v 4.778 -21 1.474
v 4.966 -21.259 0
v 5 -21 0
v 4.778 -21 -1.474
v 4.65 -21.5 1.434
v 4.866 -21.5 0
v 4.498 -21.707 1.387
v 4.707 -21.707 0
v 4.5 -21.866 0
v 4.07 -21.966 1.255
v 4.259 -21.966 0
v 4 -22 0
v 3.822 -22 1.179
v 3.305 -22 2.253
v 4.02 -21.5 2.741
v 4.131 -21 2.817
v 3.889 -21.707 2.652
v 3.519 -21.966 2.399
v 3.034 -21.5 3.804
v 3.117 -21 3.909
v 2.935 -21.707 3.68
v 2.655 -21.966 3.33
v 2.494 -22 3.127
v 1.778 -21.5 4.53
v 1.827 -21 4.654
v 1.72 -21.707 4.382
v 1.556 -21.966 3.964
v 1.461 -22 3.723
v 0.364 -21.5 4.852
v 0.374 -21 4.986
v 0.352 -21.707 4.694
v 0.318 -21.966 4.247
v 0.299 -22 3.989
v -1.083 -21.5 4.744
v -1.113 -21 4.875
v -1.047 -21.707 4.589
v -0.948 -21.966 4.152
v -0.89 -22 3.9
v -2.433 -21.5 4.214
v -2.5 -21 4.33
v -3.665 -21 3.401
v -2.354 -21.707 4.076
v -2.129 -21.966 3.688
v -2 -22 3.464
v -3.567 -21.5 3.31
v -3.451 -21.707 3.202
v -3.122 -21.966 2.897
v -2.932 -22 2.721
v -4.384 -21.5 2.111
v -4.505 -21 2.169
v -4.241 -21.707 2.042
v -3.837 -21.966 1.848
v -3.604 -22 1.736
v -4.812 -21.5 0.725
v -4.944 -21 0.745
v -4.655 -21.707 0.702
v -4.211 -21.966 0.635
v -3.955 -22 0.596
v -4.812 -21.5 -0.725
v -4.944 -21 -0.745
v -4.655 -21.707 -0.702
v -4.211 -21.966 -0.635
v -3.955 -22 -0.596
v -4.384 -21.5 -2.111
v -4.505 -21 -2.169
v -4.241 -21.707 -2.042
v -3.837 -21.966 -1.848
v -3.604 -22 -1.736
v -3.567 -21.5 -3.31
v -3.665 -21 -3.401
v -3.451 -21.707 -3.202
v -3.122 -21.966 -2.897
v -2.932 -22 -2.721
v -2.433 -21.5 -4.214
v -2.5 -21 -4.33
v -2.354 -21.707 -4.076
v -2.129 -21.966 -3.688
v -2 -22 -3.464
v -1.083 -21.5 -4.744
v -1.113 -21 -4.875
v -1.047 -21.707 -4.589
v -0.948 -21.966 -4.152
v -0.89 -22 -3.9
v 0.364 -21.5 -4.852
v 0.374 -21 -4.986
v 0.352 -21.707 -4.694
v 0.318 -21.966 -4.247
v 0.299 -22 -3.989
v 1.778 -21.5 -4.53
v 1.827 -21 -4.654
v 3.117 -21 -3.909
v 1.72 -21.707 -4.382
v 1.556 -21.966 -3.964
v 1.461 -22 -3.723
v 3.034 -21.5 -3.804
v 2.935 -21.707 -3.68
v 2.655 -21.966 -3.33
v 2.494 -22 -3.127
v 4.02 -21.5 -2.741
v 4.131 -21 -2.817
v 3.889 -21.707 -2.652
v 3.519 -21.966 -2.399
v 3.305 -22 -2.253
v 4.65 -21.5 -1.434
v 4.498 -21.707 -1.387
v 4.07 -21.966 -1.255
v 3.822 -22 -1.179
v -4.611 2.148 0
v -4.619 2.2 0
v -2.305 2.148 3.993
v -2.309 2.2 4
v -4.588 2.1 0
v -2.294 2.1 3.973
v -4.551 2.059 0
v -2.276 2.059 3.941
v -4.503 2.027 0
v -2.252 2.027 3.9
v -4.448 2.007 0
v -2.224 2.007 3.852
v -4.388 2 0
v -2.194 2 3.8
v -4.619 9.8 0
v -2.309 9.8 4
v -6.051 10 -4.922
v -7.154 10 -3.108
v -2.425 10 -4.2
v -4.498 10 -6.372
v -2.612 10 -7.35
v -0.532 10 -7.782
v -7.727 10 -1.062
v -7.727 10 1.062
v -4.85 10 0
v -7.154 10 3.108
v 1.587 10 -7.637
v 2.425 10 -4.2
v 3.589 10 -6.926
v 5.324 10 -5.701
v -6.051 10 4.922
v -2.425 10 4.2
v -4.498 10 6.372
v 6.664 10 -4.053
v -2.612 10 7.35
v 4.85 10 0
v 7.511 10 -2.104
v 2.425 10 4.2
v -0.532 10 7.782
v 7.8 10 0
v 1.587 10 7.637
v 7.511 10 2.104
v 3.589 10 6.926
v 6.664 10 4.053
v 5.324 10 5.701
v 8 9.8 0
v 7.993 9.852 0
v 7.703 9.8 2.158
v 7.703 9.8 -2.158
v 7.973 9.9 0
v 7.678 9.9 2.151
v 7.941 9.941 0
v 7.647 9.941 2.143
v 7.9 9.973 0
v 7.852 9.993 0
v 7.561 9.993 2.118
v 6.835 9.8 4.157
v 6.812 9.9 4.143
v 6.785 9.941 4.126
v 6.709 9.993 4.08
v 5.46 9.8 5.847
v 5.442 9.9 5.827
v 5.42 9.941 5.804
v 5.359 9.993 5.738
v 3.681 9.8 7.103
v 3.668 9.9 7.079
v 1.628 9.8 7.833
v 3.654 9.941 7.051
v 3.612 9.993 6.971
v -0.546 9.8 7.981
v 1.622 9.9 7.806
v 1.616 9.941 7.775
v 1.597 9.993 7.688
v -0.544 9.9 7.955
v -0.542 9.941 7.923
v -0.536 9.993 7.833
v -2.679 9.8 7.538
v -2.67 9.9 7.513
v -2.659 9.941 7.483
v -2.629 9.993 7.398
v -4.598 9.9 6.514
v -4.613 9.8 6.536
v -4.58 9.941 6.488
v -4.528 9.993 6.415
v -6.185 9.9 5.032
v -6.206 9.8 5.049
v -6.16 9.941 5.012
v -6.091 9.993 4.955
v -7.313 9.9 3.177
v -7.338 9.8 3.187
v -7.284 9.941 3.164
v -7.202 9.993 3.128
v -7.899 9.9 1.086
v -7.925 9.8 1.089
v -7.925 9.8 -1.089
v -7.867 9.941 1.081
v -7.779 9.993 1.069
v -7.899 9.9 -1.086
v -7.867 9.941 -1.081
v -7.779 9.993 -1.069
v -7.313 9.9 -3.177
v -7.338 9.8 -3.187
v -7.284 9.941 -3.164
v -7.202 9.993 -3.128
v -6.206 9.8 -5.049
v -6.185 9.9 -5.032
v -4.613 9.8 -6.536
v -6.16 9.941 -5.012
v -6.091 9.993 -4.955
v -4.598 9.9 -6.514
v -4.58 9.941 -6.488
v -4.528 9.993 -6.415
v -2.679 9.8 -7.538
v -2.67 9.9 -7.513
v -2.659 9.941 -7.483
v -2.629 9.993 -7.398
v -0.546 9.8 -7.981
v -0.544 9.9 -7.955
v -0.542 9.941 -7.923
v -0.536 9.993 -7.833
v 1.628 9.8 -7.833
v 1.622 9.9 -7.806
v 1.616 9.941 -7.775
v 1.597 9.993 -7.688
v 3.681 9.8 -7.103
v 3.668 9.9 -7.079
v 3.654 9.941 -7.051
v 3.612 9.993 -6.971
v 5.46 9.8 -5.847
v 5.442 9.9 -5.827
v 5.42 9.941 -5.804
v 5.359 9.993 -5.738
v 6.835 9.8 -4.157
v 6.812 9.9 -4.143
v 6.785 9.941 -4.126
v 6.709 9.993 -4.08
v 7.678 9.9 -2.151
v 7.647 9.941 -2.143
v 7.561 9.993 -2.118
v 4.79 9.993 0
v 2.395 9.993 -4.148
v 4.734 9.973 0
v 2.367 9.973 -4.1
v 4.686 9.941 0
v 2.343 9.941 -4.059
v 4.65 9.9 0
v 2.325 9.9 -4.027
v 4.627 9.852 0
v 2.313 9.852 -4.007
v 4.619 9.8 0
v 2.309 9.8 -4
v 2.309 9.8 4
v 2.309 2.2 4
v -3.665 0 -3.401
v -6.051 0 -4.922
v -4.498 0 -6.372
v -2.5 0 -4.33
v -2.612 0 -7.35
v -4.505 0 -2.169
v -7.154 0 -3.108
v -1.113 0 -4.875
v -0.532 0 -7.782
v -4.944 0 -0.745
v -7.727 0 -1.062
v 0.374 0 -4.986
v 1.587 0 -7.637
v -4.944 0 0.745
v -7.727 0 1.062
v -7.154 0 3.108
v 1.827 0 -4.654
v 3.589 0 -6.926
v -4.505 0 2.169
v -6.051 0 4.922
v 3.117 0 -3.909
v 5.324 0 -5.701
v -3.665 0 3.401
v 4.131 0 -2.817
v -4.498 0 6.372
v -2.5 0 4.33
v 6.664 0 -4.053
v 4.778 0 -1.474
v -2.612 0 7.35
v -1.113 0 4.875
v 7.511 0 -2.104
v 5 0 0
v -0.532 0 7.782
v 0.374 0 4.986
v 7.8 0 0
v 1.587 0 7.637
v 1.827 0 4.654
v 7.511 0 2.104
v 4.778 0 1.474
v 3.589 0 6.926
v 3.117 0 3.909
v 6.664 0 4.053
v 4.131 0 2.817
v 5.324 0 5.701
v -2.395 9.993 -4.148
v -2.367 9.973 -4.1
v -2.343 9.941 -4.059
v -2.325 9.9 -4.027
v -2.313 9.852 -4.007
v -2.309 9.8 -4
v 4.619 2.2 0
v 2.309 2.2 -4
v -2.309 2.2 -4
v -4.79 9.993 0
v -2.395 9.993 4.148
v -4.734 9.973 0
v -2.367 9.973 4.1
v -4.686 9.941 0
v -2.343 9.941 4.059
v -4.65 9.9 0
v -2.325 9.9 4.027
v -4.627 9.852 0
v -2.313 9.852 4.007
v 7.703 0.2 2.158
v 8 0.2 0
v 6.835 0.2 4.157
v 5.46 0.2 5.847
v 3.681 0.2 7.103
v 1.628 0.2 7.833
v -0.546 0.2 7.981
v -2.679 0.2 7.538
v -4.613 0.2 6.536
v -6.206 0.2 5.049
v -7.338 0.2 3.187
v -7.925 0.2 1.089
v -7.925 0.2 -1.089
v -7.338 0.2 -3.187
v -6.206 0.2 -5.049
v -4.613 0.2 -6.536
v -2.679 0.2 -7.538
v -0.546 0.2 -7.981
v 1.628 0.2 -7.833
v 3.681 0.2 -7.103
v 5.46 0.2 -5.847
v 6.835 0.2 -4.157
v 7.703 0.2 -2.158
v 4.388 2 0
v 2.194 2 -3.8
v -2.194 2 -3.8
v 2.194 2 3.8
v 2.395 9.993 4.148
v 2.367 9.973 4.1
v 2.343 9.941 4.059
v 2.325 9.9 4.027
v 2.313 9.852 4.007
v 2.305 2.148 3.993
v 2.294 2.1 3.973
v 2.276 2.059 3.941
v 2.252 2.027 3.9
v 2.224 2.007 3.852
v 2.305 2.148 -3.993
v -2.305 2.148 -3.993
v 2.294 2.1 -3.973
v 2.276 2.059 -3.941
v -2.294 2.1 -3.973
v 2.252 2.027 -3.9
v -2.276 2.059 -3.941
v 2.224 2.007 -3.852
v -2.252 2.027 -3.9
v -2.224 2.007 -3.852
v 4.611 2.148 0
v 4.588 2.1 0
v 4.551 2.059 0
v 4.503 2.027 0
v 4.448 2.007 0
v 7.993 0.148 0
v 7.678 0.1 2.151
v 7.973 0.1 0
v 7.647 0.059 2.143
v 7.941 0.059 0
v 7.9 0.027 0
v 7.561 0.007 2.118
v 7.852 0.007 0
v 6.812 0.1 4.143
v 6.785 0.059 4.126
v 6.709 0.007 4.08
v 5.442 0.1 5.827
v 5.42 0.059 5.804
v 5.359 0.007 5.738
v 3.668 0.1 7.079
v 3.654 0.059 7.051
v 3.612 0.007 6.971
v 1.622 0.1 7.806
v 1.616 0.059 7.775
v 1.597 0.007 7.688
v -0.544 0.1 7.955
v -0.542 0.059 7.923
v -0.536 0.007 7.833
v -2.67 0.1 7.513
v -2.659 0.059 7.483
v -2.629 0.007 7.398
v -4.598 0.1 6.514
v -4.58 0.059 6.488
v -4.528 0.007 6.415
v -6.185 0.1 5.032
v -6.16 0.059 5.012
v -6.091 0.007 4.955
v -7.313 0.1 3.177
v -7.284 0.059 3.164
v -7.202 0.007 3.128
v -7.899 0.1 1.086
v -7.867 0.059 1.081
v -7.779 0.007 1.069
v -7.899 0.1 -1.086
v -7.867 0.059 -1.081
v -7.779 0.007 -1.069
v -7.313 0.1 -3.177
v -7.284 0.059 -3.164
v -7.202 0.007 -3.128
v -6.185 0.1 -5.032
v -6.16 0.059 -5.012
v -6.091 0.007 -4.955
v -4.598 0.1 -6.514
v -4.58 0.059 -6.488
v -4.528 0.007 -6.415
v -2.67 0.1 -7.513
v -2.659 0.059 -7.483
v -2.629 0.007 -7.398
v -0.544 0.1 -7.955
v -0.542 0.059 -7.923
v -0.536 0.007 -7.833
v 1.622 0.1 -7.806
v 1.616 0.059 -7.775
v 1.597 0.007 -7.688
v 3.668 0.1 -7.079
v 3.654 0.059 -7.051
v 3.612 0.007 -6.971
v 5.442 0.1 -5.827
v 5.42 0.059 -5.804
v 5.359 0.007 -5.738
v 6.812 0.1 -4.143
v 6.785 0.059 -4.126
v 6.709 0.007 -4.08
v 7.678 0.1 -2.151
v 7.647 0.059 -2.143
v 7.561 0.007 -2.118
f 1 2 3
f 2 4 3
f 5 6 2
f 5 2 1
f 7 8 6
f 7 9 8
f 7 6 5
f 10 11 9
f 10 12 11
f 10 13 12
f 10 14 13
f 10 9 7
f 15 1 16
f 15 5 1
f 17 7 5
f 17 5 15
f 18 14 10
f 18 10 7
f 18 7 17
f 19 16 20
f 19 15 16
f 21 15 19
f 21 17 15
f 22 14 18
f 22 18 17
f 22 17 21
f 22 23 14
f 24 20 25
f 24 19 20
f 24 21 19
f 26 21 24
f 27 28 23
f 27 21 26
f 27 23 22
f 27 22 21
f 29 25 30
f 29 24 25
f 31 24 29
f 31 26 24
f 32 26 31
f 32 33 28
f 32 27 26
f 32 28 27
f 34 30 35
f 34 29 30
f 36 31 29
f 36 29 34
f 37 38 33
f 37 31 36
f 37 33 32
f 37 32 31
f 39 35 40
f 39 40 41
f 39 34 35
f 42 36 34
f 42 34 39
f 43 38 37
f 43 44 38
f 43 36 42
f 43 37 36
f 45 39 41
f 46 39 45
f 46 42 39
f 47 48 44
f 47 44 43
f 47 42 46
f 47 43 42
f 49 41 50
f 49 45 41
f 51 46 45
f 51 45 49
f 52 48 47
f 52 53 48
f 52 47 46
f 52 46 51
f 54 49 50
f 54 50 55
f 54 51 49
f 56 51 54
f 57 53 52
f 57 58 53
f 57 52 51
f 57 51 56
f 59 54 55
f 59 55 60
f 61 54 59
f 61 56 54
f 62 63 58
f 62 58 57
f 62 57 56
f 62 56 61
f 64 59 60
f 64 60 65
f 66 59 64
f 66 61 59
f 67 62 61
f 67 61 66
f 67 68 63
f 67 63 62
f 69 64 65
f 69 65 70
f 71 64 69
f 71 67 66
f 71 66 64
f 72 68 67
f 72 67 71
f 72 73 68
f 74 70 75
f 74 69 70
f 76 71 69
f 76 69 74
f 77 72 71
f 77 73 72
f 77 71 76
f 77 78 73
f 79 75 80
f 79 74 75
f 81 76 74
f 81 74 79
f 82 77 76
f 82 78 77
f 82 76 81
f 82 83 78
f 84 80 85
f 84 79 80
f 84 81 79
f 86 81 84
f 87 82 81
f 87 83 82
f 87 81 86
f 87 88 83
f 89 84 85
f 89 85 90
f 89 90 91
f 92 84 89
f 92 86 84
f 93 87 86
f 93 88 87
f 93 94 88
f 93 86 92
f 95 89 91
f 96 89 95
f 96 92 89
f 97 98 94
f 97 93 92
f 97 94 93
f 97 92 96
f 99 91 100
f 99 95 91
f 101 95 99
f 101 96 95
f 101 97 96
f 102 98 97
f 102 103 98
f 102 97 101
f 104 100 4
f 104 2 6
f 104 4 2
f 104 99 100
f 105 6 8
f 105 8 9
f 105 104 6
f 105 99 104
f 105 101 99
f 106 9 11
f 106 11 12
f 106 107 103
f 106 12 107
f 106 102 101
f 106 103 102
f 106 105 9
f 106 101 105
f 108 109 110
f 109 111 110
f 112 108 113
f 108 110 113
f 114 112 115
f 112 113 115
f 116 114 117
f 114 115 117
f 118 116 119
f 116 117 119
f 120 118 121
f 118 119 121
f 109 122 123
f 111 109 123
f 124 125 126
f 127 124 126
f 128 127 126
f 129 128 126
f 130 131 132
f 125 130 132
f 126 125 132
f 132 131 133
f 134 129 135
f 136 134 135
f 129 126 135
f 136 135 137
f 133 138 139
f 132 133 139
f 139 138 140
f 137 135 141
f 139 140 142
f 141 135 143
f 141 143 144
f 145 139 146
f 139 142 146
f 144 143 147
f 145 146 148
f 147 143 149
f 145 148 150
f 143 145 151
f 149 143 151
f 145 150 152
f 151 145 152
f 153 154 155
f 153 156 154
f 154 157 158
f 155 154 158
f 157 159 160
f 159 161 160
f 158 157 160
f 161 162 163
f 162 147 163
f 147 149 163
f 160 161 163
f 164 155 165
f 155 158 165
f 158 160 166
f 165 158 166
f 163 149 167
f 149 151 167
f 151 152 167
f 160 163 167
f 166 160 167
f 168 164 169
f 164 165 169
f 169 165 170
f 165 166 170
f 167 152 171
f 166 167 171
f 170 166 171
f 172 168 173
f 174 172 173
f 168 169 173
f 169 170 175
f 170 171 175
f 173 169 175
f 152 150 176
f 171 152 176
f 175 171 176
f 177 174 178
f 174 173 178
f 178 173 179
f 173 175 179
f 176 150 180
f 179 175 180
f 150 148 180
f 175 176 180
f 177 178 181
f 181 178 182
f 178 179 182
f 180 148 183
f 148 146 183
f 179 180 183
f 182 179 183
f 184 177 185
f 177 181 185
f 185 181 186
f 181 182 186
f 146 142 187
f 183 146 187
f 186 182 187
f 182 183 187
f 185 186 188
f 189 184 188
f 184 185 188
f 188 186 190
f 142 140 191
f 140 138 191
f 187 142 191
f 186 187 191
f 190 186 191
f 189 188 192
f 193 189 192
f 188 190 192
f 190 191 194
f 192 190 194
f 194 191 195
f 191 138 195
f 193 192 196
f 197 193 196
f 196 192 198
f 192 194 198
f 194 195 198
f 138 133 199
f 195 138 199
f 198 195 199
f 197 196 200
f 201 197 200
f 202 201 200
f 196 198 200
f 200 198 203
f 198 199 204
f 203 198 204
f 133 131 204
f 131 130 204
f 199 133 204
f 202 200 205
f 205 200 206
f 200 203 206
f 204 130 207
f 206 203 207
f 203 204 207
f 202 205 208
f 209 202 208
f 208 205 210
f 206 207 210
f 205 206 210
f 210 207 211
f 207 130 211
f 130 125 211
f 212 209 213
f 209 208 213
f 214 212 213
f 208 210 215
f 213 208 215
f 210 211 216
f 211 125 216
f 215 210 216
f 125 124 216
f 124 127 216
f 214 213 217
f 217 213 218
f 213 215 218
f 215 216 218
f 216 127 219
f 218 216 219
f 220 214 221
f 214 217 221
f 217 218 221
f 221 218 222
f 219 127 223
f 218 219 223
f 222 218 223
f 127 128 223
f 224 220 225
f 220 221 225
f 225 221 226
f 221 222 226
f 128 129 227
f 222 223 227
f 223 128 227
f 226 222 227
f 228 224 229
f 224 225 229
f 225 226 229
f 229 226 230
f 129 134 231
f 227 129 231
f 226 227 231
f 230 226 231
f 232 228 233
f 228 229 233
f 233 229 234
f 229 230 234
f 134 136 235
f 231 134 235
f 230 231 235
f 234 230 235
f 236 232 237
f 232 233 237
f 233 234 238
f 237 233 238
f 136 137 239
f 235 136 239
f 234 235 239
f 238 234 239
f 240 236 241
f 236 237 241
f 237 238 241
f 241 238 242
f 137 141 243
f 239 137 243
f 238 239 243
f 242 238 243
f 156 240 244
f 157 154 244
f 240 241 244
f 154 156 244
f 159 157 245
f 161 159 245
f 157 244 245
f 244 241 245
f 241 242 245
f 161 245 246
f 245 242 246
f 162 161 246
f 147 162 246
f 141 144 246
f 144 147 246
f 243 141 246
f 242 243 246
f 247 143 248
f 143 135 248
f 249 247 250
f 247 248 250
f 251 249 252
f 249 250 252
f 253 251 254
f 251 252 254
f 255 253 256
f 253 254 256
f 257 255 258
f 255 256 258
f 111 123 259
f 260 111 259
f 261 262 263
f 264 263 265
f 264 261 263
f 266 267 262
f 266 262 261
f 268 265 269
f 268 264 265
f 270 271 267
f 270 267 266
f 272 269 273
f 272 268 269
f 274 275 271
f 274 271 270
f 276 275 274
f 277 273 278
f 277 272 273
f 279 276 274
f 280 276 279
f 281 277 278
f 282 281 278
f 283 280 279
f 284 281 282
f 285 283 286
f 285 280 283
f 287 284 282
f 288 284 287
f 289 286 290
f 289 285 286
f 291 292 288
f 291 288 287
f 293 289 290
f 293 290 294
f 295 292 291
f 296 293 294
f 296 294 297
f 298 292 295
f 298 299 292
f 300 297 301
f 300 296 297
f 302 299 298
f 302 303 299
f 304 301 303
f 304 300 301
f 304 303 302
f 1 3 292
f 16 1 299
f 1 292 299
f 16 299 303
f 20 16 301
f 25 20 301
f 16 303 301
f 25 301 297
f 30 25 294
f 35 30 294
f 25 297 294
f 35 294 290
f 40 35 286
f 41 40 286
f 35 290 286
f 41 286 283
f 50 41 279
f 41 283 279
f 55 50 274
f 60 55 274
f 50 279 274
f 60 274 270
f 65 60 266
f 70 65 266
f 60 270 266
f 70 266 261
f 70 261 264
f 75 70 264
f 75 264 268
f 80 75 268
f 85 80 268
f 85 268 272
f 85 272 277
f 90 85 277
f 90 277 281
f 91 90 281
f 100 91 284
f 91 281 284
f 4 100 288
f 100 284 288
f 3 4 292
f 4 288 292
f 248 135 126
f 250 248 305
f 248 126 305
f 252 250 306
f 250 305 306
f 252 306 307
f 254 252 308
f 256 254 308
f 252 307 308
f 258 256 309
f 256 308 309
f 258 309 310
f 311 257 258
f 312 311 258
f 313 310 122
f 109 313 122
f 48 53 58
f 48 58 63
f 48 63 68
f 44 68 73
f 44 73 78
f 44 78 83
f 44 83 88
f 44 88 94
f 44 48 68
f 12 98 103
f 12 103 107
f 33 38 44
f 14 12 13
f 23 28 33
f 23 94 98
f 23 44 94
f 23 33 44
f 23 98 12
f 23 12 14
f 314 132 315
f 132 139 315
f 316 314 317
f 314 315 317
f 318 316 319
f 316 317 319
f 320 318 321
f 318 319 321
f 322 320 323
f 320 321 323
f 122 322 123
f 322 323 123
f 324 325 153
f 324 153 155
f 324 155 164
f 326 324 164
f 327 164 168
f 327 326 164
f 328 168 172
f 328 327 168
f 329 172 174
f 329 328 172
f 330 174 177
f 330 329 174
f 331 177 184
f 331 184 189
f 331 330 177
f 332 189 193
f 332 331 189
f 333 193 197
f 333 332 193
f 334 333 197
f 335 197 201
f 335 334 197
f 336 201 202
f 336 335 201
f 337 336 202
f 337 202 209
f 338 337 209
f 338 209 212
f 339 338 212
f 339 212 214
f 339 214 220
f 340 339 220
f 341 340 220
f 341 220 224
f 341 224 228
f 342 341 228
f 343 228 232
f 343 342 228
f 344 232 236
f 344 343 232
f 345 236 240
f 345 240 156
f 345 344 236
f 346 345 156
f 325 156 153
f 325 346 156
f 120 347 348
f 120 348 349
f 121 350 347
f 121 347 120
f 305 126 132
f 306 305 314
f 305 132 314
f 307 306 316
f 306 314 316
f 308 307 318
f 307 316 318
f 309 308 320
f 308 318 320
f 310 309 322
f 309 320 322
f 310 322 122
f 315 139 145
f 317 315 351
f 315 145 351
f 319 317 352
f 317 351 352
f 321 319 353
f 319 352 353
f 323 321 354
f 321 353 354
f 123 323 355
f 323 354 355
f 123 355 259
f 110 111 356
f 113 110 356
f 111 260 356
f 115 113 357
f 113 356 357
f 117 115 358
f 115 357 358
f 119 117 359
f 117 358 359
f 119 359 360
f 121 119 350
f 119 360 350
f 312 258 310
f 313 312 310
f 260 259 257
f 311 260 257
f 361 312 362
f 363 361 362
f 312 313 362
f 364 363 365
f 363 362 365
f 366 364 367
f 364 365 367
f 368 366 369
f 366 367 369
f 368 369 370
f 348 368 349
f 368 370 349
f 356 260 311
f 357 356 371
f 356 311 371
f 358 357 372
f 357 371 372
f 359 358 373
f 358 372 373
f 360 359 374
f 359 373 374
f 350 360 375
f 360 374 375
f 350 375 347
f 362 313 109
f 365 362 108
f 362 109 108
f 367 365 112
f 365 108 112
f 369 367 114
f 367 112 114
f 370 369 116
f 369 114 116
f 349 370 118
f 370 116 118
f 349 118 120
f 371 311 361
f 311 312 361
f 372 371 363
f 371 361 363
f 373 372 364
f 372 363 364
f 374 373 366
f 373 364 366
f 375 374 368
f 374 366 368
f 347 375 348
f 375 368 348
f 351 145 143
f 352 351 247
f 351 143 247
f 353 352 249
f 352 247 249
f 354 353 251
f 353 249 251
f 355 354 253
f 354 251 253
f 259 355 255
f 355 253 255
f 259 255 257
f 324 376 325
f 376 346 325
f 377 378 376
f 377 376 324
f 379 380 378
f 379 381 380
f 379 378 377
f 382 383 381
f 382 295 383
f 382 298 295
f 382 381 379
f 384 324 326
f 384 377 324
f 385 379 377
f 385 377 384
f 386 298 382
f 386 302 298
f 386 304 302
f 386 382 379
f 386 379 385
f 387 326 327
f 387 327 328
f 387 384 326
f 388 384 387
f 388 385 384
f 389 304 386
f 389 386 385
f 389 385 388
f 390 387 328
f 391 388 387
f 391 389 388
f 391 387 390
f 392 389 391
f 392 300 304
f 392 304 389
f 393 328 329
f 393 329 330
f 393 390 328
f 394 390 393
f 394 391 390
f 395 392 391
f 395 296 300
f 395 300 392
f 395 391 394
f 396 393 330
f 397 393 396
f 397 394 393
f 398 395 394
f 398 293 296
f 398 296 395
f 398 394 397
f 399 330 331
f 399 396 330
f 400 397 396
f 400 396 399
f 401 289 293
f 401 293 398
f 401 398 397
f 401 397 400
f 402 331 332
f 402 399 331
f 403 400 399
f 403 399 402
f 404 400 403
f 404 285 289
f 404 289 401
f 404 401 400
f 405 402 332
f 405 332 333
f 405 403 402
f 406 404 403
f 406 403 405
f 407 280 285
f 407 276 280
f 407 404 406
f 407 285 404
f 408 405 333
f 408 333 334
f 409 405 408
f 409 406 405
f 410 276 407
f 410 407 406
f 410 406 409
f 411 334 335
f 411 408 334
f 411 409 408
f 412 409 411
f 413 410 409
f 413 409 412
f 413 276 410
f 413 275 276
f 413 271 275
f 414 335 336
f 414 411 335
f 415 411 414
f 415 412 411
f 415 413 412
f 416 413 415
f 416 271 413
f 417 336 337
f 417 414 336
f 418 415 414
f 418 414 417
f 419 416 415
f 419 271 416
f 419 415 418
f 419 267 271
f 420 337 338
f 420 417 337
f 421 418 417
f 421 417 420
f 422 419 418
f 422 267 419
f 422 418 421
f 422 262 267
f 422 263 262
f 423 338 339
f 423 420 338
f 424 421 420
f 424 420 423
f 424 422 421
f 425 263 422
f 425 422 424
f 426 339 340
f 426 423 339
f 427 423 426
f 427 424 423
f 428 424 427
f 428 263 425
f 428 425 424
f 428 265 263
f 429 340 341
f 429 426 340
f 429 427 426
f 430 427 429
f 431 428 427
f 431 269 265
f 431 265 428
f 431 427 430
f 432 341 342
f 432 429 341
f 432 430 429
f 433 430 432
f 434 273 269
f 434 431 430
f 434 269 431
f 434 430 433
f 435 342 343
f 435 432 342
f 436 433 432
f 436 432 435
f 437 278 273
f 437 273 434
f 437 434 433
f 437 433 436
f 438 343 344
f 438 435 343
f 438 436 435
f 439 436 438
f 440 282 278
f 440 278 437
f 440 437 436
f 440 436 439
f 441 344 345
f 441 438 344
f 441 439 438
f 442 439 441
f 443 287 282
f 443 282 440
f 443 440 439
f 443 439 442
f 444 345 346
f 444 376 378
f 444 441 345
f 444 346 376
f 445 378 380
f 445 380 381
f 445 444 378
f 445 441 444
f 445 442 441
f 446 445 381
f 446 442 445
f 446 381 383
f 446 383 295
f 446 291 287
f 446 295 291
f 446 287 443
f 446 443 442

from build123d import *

# Parameters (mm, degrees)
F0_R     = 5
F1_DEPTH = 22
F0_R_2   = 8
F2_DEPTH = 10
F4_DEPTH = 8
F5_R     = 0.2
F6_R     = 1


# Not quite as in the source:
# - a feature names something its author has since deleted; it is built from what else it names


with BuildPart() as f1:
    # F0 (on Front) → F1 (new body)
    with BuildSketch(Plane.XZ):
        Circle(F0_R)
    extrude(amount=F1_DEPTH)

    # F0 (on Front) → F2 (join)
    with BuildSketch(Plane.XZ):
        Circle(F0_R_2)
        Circle(F0_R, mode=Mode.SUBTRACT)
        Circle(F0_R)
    extrude(amount=-F2_DEPTH)

    # F3 (on face) → F4 (cut)
    with BuildSketch(Plane(origin=(0, 10, 0), x_dir=(-1, 0, 0), z_dir=(0, 1, 0))):
        Polygon((-2.3094010768, -4), (2.3094010768, -4), (4.6188021535, 0), (2.3094010768, 4), (-2.3094010768, 4), (-4.6188021535, 0), align=None)
    extrude(amount=-F4_DEPTH, mode=Mode.SUBTRACT)

    # F5
    f5_edges = [f1.edges().sort_by_distance(p)[0] for p in [
        (-3.464102, 2, 2),
        (3.464102, 2, -2),
        (0, 2, 4),
        (0, 10, -4),
        (-3.464102, 2, -2),
        (0, 2, -4),
        (3.464102, 10, 2),
        (3.464102, 2, 2),
        (-3.464102, 10, -2),
        (-3.464102, 10, 2),
        (-8, 10, 0),
        (0, 10, 4),
        (3.464102, 10, -2),
        (-8, 0, 0),
    ]]
    fillet(f5_edges, radius=F5_R)

    # F6
    f6_edges = [f1.edges().sort_by_distance(p)[0] for p in [
        (-5, -22, 0),
    ]]
    fillet(f6_edges, radius=F6_R)


solid = f1.part
